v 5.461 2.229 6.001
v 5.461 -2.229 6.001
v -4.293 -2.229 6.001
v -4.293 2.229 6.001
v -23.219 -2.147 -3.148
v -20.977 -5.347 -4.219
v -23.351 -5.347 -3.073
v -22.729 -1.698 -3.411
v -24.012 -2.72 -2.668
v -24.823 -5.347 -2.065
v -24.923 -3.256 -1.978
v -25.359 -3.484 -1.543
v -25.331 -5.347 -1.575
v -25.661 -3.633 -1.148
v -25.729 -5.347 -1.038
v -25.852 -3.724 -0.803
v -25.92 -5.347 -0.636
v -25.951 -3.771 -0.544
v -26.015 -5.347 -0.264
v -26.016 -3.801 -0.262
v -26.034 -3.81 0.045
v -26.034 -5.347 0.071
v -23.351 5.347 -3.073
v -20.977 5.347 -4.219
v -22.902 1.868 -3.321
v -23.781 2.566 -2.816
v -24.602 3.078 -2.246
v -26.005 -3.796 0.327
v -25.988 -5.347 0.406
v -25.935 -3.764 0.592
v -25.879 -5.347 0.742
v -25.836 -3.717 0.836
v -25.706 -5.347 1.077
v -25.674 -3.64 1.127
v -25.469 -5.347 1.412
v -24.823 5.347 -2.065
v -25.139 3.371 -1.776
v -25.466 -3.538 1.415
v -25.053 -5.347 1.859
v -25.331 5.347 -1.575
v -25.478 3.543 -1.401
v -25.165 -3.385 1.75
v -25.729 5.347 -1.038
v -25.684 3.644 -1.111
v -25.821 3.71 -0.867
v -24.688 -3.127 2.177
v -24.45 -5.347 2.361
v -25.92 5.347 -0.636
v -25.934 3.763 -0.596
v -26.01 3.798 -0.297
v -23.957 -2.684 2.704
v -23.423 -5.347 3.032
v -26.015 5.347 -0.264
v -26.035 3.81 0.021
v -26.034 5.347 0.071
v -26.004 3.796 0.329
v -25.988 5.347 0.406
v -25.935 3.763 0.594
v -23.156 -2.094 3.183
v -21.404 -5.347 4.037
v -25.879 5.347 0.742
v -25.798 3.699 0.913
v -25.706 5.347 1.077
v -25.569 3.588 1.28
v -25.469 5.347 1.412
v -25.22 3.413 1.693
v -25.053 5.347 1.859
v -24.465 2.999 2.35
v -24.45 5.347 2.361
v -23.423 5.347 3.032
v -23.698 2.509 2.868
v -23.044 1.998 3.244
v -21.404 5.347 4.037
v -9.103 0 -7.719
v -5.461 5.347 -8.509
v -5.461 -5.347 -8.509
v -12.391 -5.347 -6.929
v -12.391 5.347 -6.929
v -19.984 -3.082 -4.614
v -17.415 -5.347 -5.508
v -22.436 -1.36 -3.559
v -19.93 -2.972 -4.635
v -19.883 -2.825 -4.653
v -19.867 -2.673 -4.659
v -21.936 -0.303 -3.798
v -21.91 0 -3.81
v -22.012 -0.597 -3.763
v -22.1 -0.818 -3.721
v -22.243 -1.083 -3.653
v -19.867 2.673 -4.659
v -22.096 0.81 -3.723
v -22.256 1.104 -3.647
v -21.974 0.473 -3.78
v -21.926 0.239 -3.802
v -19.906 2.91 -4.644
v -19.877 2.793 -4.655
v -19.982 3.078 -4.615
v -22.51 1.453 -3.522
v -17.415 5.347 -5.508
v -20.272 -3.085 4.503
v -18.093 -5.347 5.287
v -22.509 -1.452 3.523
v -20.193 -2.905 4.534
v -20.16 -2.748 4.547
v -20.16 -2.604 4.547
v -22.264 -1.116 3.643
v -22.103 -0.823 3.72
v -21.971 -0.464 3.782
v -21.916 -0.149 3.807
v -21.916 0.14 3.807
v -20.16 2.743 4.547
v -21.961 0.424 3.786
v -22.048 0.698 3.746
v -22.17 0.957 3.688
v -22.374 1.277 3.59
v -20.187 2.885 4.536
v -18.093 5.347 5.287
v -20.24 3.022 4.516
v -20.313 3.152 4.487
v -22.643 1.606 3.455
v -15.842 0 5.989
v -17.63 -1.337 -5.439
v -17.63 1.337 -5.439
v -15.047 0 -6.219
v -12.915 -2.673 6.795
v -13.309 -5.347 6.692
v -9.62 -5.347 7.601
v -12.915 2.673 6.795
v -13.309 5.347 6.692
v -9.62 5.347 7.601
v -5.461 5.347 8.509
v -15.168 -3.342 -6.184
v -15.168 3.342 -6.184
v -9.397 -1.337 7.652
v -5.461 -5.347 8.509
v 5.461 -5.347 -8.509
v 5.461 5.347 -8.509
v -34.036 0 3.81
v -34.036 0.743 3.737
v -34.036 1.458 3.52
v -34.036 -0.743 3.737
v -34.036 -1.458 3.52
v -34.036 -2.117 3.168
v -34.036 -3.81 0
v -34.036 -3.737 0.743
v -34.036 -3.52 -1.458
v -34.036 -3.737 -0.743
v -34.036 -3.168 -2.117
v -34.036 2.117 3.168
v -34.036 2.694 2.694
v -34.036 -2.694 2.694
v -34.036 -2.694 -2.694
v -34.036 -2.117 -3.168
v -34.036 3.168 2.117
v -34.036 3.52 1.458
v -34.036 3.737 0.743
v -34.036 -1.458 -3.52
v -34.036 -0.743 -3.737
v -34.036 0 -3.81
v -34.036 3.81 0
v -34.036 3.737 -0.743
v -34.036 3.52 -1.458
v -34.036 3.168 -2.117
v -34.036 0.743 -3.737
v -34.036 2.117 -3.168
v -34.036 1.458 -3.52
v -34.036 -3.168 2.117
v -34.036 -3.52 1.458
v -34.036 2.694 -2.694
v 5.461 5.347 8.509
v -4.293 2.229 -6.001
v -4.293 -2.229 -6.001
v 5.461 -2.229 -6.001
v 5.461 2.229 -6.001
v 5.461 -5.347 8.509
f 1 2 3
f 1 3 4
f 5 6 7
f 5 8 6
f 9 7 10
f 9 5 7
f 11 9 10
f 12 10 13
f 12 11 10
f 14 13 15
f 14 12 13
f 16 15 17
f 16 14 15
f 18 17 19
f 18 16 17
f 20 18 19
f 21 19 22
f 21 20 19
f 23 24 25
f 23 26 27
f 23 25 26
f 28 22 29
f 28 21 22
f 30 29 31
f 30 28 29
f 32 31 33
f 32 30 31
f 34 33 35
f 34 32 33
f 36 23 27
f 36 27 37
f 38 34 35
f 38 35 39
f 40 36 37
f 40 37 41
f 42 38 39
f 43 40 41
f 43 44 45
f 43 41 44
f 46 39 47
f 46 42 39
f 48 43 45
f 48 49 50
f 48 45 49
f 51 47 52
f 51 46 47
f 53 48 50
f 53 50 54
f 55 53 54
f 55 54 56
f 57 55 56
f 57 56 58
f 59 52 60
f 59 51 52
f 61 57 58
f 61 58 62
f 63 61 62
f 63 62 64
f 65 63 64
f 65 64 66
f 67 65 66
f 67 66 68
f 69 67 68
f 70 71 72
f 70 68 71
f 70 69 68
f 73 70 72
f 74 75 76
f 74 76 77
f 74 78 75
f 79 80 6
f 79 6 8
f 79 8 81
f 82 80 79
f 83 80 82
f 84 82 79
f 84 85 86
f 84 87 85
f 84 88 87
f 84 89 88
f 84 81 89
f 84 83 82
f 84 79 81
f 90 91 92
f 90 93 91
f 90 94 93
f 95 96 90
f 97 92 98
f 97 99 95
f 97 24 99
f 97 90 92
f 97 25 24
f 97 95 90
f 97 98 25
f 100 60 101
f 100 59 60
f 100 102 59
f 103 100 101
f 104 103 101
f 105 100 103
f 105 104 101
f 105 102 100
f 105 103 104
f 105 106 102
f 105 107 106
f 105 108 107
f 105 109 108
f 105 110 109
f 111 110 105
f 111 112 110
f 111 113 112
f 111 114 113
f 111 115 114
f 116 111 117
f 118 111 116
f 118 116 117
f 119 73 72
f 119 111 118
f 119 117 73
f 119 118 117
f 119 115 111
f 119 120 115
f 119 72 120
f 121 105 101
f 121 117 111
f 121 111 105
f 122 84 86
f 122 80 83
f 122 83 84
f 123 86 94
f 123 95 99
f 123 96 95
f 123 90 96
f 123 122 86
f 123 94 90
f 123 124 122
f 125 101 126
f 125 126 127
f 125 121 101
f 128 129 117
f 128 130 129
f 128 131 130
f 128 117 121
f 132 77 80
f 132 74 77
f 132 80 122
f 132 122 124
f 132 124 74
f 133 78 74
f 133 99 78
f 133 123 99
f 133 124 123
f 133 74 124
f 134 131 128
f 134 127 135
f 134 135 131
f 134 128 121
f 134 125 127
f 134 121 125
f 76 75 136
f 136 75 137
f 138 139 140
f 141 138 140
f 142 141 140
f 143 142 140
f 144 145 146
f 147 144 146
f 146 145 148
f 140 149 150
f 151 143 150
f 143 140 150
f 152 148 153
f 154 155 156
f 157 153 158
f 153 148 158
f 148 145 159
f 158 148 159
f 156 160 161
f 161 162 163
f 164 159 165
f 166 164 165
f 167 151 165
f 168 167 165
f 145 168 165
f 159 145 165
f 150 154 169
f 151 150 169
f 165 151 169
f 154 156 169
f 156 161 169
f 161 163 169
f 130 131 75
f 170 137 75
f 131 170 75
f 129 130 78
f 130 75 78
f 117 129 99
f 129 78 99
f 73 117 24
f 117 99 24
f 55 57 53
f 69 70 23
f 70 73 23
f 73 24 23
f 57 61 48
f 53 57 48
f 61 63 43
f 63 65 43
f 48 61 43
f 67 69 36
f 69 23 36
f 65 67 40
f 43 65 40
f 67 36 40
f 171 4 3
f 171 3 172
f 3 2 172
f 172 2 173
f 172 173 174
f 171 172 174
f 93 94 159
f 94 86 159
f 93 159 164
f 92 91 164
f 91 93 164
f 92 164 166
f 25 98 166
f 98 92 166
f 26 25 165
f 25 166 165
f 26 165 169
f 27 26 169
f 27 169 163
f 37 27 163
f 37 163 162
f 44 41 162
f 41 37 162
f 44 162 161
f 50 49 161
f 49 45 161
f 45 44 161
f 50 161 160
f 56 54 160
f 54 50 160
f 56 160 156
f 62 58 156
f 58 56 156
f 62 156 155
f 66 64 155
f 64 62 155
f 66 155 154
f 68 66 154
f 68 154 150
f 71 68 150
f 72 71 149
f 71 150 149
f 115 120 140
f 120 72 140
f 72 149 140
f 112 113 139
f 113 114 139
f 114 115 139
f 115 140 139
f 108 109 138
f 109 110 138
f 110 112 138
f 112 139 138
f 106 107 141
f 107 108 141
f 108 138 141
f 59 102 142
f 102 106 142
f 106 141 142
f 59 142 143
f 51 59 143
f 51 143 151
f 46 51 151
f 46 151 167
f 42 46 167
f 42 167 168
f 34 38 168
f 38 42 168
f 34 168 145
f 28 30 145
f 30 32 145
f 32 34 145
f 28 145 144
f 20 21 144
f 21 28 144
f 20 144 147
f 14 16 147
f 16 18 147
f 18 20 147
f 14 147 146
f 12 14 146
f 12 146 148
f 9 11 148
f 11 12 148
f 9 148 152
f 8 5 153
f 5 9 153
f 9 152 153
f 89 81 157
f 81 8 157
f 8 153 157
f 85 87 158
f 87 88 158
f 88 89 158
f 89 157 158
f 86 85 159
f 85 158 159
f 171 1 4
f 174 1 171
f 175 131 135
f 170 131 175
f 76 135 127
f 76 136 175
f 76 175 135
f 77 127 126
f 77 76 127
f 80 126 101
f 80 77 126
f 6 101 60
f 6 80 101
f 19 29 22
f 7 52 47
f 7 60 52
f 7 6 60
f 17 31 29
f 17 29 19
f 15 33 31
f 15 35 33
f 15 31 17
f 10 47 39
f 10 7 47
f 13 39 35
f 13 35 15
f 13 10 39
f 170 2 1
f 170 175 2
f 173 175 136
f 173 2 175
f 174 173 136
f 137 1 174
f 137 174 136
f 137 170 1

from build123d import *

# Parameters (mm, degrees)
SKETCH1_W                = 10.922
SKETCH1_H                = 17.018
BOSS_EXTRUDE1_DEPTH      = 5.3467
SKETCH2_W                = 12.0015
SKETCH2_H                = 4.4577
CUT_EXTRUDE1_DEPTH       = 9.7536
BOSS_EXTRUDE2_DEPTH      = 10.6934
BOSS_EXTRUDE3_DEPTH      = 9.7536
BOSS_EXTRUDE3_DEPTH_BACK = 8.001
SKETCH4_R                = 3.81


with BuildPart() as part:
    # Sketch1 → Boss-Extrude1 (new, symmetric)
    with BuildSketch(Plane(origin=(0, 0, 0), x_dir=(1, 0, 0), z_dir=(0, 1, 0))):
        Rectangle(SKETCH1_W, SKETCH1_H)
    extrude(amount=BOSS_EXTRUDE1_DEPTH, both=True)

    # Sketch2 → Cut-Extrude1 (cut)
    with BuildSketch(Plane(origin=(5.461, 0, 0), x_dir=(0, 0, -1), z_dir=(1, 0, 0))):
        Rectangle(SKETCH2_W, SKETCH2_H)
    extrude(amount=-CUT_EXTRUDE1_DEPTH, mode=Mode.SUBTRACT)

    # Sketch3 → Boss-Extrude2 (add)
    with BuildSketch(Plane(origin=(0, 5.3467, 0), x_dir=(1, 0, 0), z_dir=(0, 1, 0))):
        with BuildLine():
            Line((-5.461, 8.509), (-5.461, -8.509))
            add(Edge.make_bspline(
                [(-5.461, 8.509), (-46.609, 0), (-5.461, -8.509)],
                knots=[0, 0, 0, 1, 1, 1], degree=2))
        make_face()
    extrude(amount=-BOSS_EXTRUDE2_DEPTH)

    # Sketch4 → Boss-Extrude3 (add, two sides: drawn at the far end of the back side and taken through both)
    with BuildSketch(Plane(origin=(-26.035, 0, 0), x_dir=(0, 0, -1), z_dir=(1, 0, 0)).offset(-BOSS_EXTRUDE3_DEPTH_BACK)):
        Circle(SKETCH4_R)
    extrude(amount=BOSS_EXTRUDE3_DEPTH + BOSS_EXTRUDE3_DEPTH_BACK)


solid = part.part
